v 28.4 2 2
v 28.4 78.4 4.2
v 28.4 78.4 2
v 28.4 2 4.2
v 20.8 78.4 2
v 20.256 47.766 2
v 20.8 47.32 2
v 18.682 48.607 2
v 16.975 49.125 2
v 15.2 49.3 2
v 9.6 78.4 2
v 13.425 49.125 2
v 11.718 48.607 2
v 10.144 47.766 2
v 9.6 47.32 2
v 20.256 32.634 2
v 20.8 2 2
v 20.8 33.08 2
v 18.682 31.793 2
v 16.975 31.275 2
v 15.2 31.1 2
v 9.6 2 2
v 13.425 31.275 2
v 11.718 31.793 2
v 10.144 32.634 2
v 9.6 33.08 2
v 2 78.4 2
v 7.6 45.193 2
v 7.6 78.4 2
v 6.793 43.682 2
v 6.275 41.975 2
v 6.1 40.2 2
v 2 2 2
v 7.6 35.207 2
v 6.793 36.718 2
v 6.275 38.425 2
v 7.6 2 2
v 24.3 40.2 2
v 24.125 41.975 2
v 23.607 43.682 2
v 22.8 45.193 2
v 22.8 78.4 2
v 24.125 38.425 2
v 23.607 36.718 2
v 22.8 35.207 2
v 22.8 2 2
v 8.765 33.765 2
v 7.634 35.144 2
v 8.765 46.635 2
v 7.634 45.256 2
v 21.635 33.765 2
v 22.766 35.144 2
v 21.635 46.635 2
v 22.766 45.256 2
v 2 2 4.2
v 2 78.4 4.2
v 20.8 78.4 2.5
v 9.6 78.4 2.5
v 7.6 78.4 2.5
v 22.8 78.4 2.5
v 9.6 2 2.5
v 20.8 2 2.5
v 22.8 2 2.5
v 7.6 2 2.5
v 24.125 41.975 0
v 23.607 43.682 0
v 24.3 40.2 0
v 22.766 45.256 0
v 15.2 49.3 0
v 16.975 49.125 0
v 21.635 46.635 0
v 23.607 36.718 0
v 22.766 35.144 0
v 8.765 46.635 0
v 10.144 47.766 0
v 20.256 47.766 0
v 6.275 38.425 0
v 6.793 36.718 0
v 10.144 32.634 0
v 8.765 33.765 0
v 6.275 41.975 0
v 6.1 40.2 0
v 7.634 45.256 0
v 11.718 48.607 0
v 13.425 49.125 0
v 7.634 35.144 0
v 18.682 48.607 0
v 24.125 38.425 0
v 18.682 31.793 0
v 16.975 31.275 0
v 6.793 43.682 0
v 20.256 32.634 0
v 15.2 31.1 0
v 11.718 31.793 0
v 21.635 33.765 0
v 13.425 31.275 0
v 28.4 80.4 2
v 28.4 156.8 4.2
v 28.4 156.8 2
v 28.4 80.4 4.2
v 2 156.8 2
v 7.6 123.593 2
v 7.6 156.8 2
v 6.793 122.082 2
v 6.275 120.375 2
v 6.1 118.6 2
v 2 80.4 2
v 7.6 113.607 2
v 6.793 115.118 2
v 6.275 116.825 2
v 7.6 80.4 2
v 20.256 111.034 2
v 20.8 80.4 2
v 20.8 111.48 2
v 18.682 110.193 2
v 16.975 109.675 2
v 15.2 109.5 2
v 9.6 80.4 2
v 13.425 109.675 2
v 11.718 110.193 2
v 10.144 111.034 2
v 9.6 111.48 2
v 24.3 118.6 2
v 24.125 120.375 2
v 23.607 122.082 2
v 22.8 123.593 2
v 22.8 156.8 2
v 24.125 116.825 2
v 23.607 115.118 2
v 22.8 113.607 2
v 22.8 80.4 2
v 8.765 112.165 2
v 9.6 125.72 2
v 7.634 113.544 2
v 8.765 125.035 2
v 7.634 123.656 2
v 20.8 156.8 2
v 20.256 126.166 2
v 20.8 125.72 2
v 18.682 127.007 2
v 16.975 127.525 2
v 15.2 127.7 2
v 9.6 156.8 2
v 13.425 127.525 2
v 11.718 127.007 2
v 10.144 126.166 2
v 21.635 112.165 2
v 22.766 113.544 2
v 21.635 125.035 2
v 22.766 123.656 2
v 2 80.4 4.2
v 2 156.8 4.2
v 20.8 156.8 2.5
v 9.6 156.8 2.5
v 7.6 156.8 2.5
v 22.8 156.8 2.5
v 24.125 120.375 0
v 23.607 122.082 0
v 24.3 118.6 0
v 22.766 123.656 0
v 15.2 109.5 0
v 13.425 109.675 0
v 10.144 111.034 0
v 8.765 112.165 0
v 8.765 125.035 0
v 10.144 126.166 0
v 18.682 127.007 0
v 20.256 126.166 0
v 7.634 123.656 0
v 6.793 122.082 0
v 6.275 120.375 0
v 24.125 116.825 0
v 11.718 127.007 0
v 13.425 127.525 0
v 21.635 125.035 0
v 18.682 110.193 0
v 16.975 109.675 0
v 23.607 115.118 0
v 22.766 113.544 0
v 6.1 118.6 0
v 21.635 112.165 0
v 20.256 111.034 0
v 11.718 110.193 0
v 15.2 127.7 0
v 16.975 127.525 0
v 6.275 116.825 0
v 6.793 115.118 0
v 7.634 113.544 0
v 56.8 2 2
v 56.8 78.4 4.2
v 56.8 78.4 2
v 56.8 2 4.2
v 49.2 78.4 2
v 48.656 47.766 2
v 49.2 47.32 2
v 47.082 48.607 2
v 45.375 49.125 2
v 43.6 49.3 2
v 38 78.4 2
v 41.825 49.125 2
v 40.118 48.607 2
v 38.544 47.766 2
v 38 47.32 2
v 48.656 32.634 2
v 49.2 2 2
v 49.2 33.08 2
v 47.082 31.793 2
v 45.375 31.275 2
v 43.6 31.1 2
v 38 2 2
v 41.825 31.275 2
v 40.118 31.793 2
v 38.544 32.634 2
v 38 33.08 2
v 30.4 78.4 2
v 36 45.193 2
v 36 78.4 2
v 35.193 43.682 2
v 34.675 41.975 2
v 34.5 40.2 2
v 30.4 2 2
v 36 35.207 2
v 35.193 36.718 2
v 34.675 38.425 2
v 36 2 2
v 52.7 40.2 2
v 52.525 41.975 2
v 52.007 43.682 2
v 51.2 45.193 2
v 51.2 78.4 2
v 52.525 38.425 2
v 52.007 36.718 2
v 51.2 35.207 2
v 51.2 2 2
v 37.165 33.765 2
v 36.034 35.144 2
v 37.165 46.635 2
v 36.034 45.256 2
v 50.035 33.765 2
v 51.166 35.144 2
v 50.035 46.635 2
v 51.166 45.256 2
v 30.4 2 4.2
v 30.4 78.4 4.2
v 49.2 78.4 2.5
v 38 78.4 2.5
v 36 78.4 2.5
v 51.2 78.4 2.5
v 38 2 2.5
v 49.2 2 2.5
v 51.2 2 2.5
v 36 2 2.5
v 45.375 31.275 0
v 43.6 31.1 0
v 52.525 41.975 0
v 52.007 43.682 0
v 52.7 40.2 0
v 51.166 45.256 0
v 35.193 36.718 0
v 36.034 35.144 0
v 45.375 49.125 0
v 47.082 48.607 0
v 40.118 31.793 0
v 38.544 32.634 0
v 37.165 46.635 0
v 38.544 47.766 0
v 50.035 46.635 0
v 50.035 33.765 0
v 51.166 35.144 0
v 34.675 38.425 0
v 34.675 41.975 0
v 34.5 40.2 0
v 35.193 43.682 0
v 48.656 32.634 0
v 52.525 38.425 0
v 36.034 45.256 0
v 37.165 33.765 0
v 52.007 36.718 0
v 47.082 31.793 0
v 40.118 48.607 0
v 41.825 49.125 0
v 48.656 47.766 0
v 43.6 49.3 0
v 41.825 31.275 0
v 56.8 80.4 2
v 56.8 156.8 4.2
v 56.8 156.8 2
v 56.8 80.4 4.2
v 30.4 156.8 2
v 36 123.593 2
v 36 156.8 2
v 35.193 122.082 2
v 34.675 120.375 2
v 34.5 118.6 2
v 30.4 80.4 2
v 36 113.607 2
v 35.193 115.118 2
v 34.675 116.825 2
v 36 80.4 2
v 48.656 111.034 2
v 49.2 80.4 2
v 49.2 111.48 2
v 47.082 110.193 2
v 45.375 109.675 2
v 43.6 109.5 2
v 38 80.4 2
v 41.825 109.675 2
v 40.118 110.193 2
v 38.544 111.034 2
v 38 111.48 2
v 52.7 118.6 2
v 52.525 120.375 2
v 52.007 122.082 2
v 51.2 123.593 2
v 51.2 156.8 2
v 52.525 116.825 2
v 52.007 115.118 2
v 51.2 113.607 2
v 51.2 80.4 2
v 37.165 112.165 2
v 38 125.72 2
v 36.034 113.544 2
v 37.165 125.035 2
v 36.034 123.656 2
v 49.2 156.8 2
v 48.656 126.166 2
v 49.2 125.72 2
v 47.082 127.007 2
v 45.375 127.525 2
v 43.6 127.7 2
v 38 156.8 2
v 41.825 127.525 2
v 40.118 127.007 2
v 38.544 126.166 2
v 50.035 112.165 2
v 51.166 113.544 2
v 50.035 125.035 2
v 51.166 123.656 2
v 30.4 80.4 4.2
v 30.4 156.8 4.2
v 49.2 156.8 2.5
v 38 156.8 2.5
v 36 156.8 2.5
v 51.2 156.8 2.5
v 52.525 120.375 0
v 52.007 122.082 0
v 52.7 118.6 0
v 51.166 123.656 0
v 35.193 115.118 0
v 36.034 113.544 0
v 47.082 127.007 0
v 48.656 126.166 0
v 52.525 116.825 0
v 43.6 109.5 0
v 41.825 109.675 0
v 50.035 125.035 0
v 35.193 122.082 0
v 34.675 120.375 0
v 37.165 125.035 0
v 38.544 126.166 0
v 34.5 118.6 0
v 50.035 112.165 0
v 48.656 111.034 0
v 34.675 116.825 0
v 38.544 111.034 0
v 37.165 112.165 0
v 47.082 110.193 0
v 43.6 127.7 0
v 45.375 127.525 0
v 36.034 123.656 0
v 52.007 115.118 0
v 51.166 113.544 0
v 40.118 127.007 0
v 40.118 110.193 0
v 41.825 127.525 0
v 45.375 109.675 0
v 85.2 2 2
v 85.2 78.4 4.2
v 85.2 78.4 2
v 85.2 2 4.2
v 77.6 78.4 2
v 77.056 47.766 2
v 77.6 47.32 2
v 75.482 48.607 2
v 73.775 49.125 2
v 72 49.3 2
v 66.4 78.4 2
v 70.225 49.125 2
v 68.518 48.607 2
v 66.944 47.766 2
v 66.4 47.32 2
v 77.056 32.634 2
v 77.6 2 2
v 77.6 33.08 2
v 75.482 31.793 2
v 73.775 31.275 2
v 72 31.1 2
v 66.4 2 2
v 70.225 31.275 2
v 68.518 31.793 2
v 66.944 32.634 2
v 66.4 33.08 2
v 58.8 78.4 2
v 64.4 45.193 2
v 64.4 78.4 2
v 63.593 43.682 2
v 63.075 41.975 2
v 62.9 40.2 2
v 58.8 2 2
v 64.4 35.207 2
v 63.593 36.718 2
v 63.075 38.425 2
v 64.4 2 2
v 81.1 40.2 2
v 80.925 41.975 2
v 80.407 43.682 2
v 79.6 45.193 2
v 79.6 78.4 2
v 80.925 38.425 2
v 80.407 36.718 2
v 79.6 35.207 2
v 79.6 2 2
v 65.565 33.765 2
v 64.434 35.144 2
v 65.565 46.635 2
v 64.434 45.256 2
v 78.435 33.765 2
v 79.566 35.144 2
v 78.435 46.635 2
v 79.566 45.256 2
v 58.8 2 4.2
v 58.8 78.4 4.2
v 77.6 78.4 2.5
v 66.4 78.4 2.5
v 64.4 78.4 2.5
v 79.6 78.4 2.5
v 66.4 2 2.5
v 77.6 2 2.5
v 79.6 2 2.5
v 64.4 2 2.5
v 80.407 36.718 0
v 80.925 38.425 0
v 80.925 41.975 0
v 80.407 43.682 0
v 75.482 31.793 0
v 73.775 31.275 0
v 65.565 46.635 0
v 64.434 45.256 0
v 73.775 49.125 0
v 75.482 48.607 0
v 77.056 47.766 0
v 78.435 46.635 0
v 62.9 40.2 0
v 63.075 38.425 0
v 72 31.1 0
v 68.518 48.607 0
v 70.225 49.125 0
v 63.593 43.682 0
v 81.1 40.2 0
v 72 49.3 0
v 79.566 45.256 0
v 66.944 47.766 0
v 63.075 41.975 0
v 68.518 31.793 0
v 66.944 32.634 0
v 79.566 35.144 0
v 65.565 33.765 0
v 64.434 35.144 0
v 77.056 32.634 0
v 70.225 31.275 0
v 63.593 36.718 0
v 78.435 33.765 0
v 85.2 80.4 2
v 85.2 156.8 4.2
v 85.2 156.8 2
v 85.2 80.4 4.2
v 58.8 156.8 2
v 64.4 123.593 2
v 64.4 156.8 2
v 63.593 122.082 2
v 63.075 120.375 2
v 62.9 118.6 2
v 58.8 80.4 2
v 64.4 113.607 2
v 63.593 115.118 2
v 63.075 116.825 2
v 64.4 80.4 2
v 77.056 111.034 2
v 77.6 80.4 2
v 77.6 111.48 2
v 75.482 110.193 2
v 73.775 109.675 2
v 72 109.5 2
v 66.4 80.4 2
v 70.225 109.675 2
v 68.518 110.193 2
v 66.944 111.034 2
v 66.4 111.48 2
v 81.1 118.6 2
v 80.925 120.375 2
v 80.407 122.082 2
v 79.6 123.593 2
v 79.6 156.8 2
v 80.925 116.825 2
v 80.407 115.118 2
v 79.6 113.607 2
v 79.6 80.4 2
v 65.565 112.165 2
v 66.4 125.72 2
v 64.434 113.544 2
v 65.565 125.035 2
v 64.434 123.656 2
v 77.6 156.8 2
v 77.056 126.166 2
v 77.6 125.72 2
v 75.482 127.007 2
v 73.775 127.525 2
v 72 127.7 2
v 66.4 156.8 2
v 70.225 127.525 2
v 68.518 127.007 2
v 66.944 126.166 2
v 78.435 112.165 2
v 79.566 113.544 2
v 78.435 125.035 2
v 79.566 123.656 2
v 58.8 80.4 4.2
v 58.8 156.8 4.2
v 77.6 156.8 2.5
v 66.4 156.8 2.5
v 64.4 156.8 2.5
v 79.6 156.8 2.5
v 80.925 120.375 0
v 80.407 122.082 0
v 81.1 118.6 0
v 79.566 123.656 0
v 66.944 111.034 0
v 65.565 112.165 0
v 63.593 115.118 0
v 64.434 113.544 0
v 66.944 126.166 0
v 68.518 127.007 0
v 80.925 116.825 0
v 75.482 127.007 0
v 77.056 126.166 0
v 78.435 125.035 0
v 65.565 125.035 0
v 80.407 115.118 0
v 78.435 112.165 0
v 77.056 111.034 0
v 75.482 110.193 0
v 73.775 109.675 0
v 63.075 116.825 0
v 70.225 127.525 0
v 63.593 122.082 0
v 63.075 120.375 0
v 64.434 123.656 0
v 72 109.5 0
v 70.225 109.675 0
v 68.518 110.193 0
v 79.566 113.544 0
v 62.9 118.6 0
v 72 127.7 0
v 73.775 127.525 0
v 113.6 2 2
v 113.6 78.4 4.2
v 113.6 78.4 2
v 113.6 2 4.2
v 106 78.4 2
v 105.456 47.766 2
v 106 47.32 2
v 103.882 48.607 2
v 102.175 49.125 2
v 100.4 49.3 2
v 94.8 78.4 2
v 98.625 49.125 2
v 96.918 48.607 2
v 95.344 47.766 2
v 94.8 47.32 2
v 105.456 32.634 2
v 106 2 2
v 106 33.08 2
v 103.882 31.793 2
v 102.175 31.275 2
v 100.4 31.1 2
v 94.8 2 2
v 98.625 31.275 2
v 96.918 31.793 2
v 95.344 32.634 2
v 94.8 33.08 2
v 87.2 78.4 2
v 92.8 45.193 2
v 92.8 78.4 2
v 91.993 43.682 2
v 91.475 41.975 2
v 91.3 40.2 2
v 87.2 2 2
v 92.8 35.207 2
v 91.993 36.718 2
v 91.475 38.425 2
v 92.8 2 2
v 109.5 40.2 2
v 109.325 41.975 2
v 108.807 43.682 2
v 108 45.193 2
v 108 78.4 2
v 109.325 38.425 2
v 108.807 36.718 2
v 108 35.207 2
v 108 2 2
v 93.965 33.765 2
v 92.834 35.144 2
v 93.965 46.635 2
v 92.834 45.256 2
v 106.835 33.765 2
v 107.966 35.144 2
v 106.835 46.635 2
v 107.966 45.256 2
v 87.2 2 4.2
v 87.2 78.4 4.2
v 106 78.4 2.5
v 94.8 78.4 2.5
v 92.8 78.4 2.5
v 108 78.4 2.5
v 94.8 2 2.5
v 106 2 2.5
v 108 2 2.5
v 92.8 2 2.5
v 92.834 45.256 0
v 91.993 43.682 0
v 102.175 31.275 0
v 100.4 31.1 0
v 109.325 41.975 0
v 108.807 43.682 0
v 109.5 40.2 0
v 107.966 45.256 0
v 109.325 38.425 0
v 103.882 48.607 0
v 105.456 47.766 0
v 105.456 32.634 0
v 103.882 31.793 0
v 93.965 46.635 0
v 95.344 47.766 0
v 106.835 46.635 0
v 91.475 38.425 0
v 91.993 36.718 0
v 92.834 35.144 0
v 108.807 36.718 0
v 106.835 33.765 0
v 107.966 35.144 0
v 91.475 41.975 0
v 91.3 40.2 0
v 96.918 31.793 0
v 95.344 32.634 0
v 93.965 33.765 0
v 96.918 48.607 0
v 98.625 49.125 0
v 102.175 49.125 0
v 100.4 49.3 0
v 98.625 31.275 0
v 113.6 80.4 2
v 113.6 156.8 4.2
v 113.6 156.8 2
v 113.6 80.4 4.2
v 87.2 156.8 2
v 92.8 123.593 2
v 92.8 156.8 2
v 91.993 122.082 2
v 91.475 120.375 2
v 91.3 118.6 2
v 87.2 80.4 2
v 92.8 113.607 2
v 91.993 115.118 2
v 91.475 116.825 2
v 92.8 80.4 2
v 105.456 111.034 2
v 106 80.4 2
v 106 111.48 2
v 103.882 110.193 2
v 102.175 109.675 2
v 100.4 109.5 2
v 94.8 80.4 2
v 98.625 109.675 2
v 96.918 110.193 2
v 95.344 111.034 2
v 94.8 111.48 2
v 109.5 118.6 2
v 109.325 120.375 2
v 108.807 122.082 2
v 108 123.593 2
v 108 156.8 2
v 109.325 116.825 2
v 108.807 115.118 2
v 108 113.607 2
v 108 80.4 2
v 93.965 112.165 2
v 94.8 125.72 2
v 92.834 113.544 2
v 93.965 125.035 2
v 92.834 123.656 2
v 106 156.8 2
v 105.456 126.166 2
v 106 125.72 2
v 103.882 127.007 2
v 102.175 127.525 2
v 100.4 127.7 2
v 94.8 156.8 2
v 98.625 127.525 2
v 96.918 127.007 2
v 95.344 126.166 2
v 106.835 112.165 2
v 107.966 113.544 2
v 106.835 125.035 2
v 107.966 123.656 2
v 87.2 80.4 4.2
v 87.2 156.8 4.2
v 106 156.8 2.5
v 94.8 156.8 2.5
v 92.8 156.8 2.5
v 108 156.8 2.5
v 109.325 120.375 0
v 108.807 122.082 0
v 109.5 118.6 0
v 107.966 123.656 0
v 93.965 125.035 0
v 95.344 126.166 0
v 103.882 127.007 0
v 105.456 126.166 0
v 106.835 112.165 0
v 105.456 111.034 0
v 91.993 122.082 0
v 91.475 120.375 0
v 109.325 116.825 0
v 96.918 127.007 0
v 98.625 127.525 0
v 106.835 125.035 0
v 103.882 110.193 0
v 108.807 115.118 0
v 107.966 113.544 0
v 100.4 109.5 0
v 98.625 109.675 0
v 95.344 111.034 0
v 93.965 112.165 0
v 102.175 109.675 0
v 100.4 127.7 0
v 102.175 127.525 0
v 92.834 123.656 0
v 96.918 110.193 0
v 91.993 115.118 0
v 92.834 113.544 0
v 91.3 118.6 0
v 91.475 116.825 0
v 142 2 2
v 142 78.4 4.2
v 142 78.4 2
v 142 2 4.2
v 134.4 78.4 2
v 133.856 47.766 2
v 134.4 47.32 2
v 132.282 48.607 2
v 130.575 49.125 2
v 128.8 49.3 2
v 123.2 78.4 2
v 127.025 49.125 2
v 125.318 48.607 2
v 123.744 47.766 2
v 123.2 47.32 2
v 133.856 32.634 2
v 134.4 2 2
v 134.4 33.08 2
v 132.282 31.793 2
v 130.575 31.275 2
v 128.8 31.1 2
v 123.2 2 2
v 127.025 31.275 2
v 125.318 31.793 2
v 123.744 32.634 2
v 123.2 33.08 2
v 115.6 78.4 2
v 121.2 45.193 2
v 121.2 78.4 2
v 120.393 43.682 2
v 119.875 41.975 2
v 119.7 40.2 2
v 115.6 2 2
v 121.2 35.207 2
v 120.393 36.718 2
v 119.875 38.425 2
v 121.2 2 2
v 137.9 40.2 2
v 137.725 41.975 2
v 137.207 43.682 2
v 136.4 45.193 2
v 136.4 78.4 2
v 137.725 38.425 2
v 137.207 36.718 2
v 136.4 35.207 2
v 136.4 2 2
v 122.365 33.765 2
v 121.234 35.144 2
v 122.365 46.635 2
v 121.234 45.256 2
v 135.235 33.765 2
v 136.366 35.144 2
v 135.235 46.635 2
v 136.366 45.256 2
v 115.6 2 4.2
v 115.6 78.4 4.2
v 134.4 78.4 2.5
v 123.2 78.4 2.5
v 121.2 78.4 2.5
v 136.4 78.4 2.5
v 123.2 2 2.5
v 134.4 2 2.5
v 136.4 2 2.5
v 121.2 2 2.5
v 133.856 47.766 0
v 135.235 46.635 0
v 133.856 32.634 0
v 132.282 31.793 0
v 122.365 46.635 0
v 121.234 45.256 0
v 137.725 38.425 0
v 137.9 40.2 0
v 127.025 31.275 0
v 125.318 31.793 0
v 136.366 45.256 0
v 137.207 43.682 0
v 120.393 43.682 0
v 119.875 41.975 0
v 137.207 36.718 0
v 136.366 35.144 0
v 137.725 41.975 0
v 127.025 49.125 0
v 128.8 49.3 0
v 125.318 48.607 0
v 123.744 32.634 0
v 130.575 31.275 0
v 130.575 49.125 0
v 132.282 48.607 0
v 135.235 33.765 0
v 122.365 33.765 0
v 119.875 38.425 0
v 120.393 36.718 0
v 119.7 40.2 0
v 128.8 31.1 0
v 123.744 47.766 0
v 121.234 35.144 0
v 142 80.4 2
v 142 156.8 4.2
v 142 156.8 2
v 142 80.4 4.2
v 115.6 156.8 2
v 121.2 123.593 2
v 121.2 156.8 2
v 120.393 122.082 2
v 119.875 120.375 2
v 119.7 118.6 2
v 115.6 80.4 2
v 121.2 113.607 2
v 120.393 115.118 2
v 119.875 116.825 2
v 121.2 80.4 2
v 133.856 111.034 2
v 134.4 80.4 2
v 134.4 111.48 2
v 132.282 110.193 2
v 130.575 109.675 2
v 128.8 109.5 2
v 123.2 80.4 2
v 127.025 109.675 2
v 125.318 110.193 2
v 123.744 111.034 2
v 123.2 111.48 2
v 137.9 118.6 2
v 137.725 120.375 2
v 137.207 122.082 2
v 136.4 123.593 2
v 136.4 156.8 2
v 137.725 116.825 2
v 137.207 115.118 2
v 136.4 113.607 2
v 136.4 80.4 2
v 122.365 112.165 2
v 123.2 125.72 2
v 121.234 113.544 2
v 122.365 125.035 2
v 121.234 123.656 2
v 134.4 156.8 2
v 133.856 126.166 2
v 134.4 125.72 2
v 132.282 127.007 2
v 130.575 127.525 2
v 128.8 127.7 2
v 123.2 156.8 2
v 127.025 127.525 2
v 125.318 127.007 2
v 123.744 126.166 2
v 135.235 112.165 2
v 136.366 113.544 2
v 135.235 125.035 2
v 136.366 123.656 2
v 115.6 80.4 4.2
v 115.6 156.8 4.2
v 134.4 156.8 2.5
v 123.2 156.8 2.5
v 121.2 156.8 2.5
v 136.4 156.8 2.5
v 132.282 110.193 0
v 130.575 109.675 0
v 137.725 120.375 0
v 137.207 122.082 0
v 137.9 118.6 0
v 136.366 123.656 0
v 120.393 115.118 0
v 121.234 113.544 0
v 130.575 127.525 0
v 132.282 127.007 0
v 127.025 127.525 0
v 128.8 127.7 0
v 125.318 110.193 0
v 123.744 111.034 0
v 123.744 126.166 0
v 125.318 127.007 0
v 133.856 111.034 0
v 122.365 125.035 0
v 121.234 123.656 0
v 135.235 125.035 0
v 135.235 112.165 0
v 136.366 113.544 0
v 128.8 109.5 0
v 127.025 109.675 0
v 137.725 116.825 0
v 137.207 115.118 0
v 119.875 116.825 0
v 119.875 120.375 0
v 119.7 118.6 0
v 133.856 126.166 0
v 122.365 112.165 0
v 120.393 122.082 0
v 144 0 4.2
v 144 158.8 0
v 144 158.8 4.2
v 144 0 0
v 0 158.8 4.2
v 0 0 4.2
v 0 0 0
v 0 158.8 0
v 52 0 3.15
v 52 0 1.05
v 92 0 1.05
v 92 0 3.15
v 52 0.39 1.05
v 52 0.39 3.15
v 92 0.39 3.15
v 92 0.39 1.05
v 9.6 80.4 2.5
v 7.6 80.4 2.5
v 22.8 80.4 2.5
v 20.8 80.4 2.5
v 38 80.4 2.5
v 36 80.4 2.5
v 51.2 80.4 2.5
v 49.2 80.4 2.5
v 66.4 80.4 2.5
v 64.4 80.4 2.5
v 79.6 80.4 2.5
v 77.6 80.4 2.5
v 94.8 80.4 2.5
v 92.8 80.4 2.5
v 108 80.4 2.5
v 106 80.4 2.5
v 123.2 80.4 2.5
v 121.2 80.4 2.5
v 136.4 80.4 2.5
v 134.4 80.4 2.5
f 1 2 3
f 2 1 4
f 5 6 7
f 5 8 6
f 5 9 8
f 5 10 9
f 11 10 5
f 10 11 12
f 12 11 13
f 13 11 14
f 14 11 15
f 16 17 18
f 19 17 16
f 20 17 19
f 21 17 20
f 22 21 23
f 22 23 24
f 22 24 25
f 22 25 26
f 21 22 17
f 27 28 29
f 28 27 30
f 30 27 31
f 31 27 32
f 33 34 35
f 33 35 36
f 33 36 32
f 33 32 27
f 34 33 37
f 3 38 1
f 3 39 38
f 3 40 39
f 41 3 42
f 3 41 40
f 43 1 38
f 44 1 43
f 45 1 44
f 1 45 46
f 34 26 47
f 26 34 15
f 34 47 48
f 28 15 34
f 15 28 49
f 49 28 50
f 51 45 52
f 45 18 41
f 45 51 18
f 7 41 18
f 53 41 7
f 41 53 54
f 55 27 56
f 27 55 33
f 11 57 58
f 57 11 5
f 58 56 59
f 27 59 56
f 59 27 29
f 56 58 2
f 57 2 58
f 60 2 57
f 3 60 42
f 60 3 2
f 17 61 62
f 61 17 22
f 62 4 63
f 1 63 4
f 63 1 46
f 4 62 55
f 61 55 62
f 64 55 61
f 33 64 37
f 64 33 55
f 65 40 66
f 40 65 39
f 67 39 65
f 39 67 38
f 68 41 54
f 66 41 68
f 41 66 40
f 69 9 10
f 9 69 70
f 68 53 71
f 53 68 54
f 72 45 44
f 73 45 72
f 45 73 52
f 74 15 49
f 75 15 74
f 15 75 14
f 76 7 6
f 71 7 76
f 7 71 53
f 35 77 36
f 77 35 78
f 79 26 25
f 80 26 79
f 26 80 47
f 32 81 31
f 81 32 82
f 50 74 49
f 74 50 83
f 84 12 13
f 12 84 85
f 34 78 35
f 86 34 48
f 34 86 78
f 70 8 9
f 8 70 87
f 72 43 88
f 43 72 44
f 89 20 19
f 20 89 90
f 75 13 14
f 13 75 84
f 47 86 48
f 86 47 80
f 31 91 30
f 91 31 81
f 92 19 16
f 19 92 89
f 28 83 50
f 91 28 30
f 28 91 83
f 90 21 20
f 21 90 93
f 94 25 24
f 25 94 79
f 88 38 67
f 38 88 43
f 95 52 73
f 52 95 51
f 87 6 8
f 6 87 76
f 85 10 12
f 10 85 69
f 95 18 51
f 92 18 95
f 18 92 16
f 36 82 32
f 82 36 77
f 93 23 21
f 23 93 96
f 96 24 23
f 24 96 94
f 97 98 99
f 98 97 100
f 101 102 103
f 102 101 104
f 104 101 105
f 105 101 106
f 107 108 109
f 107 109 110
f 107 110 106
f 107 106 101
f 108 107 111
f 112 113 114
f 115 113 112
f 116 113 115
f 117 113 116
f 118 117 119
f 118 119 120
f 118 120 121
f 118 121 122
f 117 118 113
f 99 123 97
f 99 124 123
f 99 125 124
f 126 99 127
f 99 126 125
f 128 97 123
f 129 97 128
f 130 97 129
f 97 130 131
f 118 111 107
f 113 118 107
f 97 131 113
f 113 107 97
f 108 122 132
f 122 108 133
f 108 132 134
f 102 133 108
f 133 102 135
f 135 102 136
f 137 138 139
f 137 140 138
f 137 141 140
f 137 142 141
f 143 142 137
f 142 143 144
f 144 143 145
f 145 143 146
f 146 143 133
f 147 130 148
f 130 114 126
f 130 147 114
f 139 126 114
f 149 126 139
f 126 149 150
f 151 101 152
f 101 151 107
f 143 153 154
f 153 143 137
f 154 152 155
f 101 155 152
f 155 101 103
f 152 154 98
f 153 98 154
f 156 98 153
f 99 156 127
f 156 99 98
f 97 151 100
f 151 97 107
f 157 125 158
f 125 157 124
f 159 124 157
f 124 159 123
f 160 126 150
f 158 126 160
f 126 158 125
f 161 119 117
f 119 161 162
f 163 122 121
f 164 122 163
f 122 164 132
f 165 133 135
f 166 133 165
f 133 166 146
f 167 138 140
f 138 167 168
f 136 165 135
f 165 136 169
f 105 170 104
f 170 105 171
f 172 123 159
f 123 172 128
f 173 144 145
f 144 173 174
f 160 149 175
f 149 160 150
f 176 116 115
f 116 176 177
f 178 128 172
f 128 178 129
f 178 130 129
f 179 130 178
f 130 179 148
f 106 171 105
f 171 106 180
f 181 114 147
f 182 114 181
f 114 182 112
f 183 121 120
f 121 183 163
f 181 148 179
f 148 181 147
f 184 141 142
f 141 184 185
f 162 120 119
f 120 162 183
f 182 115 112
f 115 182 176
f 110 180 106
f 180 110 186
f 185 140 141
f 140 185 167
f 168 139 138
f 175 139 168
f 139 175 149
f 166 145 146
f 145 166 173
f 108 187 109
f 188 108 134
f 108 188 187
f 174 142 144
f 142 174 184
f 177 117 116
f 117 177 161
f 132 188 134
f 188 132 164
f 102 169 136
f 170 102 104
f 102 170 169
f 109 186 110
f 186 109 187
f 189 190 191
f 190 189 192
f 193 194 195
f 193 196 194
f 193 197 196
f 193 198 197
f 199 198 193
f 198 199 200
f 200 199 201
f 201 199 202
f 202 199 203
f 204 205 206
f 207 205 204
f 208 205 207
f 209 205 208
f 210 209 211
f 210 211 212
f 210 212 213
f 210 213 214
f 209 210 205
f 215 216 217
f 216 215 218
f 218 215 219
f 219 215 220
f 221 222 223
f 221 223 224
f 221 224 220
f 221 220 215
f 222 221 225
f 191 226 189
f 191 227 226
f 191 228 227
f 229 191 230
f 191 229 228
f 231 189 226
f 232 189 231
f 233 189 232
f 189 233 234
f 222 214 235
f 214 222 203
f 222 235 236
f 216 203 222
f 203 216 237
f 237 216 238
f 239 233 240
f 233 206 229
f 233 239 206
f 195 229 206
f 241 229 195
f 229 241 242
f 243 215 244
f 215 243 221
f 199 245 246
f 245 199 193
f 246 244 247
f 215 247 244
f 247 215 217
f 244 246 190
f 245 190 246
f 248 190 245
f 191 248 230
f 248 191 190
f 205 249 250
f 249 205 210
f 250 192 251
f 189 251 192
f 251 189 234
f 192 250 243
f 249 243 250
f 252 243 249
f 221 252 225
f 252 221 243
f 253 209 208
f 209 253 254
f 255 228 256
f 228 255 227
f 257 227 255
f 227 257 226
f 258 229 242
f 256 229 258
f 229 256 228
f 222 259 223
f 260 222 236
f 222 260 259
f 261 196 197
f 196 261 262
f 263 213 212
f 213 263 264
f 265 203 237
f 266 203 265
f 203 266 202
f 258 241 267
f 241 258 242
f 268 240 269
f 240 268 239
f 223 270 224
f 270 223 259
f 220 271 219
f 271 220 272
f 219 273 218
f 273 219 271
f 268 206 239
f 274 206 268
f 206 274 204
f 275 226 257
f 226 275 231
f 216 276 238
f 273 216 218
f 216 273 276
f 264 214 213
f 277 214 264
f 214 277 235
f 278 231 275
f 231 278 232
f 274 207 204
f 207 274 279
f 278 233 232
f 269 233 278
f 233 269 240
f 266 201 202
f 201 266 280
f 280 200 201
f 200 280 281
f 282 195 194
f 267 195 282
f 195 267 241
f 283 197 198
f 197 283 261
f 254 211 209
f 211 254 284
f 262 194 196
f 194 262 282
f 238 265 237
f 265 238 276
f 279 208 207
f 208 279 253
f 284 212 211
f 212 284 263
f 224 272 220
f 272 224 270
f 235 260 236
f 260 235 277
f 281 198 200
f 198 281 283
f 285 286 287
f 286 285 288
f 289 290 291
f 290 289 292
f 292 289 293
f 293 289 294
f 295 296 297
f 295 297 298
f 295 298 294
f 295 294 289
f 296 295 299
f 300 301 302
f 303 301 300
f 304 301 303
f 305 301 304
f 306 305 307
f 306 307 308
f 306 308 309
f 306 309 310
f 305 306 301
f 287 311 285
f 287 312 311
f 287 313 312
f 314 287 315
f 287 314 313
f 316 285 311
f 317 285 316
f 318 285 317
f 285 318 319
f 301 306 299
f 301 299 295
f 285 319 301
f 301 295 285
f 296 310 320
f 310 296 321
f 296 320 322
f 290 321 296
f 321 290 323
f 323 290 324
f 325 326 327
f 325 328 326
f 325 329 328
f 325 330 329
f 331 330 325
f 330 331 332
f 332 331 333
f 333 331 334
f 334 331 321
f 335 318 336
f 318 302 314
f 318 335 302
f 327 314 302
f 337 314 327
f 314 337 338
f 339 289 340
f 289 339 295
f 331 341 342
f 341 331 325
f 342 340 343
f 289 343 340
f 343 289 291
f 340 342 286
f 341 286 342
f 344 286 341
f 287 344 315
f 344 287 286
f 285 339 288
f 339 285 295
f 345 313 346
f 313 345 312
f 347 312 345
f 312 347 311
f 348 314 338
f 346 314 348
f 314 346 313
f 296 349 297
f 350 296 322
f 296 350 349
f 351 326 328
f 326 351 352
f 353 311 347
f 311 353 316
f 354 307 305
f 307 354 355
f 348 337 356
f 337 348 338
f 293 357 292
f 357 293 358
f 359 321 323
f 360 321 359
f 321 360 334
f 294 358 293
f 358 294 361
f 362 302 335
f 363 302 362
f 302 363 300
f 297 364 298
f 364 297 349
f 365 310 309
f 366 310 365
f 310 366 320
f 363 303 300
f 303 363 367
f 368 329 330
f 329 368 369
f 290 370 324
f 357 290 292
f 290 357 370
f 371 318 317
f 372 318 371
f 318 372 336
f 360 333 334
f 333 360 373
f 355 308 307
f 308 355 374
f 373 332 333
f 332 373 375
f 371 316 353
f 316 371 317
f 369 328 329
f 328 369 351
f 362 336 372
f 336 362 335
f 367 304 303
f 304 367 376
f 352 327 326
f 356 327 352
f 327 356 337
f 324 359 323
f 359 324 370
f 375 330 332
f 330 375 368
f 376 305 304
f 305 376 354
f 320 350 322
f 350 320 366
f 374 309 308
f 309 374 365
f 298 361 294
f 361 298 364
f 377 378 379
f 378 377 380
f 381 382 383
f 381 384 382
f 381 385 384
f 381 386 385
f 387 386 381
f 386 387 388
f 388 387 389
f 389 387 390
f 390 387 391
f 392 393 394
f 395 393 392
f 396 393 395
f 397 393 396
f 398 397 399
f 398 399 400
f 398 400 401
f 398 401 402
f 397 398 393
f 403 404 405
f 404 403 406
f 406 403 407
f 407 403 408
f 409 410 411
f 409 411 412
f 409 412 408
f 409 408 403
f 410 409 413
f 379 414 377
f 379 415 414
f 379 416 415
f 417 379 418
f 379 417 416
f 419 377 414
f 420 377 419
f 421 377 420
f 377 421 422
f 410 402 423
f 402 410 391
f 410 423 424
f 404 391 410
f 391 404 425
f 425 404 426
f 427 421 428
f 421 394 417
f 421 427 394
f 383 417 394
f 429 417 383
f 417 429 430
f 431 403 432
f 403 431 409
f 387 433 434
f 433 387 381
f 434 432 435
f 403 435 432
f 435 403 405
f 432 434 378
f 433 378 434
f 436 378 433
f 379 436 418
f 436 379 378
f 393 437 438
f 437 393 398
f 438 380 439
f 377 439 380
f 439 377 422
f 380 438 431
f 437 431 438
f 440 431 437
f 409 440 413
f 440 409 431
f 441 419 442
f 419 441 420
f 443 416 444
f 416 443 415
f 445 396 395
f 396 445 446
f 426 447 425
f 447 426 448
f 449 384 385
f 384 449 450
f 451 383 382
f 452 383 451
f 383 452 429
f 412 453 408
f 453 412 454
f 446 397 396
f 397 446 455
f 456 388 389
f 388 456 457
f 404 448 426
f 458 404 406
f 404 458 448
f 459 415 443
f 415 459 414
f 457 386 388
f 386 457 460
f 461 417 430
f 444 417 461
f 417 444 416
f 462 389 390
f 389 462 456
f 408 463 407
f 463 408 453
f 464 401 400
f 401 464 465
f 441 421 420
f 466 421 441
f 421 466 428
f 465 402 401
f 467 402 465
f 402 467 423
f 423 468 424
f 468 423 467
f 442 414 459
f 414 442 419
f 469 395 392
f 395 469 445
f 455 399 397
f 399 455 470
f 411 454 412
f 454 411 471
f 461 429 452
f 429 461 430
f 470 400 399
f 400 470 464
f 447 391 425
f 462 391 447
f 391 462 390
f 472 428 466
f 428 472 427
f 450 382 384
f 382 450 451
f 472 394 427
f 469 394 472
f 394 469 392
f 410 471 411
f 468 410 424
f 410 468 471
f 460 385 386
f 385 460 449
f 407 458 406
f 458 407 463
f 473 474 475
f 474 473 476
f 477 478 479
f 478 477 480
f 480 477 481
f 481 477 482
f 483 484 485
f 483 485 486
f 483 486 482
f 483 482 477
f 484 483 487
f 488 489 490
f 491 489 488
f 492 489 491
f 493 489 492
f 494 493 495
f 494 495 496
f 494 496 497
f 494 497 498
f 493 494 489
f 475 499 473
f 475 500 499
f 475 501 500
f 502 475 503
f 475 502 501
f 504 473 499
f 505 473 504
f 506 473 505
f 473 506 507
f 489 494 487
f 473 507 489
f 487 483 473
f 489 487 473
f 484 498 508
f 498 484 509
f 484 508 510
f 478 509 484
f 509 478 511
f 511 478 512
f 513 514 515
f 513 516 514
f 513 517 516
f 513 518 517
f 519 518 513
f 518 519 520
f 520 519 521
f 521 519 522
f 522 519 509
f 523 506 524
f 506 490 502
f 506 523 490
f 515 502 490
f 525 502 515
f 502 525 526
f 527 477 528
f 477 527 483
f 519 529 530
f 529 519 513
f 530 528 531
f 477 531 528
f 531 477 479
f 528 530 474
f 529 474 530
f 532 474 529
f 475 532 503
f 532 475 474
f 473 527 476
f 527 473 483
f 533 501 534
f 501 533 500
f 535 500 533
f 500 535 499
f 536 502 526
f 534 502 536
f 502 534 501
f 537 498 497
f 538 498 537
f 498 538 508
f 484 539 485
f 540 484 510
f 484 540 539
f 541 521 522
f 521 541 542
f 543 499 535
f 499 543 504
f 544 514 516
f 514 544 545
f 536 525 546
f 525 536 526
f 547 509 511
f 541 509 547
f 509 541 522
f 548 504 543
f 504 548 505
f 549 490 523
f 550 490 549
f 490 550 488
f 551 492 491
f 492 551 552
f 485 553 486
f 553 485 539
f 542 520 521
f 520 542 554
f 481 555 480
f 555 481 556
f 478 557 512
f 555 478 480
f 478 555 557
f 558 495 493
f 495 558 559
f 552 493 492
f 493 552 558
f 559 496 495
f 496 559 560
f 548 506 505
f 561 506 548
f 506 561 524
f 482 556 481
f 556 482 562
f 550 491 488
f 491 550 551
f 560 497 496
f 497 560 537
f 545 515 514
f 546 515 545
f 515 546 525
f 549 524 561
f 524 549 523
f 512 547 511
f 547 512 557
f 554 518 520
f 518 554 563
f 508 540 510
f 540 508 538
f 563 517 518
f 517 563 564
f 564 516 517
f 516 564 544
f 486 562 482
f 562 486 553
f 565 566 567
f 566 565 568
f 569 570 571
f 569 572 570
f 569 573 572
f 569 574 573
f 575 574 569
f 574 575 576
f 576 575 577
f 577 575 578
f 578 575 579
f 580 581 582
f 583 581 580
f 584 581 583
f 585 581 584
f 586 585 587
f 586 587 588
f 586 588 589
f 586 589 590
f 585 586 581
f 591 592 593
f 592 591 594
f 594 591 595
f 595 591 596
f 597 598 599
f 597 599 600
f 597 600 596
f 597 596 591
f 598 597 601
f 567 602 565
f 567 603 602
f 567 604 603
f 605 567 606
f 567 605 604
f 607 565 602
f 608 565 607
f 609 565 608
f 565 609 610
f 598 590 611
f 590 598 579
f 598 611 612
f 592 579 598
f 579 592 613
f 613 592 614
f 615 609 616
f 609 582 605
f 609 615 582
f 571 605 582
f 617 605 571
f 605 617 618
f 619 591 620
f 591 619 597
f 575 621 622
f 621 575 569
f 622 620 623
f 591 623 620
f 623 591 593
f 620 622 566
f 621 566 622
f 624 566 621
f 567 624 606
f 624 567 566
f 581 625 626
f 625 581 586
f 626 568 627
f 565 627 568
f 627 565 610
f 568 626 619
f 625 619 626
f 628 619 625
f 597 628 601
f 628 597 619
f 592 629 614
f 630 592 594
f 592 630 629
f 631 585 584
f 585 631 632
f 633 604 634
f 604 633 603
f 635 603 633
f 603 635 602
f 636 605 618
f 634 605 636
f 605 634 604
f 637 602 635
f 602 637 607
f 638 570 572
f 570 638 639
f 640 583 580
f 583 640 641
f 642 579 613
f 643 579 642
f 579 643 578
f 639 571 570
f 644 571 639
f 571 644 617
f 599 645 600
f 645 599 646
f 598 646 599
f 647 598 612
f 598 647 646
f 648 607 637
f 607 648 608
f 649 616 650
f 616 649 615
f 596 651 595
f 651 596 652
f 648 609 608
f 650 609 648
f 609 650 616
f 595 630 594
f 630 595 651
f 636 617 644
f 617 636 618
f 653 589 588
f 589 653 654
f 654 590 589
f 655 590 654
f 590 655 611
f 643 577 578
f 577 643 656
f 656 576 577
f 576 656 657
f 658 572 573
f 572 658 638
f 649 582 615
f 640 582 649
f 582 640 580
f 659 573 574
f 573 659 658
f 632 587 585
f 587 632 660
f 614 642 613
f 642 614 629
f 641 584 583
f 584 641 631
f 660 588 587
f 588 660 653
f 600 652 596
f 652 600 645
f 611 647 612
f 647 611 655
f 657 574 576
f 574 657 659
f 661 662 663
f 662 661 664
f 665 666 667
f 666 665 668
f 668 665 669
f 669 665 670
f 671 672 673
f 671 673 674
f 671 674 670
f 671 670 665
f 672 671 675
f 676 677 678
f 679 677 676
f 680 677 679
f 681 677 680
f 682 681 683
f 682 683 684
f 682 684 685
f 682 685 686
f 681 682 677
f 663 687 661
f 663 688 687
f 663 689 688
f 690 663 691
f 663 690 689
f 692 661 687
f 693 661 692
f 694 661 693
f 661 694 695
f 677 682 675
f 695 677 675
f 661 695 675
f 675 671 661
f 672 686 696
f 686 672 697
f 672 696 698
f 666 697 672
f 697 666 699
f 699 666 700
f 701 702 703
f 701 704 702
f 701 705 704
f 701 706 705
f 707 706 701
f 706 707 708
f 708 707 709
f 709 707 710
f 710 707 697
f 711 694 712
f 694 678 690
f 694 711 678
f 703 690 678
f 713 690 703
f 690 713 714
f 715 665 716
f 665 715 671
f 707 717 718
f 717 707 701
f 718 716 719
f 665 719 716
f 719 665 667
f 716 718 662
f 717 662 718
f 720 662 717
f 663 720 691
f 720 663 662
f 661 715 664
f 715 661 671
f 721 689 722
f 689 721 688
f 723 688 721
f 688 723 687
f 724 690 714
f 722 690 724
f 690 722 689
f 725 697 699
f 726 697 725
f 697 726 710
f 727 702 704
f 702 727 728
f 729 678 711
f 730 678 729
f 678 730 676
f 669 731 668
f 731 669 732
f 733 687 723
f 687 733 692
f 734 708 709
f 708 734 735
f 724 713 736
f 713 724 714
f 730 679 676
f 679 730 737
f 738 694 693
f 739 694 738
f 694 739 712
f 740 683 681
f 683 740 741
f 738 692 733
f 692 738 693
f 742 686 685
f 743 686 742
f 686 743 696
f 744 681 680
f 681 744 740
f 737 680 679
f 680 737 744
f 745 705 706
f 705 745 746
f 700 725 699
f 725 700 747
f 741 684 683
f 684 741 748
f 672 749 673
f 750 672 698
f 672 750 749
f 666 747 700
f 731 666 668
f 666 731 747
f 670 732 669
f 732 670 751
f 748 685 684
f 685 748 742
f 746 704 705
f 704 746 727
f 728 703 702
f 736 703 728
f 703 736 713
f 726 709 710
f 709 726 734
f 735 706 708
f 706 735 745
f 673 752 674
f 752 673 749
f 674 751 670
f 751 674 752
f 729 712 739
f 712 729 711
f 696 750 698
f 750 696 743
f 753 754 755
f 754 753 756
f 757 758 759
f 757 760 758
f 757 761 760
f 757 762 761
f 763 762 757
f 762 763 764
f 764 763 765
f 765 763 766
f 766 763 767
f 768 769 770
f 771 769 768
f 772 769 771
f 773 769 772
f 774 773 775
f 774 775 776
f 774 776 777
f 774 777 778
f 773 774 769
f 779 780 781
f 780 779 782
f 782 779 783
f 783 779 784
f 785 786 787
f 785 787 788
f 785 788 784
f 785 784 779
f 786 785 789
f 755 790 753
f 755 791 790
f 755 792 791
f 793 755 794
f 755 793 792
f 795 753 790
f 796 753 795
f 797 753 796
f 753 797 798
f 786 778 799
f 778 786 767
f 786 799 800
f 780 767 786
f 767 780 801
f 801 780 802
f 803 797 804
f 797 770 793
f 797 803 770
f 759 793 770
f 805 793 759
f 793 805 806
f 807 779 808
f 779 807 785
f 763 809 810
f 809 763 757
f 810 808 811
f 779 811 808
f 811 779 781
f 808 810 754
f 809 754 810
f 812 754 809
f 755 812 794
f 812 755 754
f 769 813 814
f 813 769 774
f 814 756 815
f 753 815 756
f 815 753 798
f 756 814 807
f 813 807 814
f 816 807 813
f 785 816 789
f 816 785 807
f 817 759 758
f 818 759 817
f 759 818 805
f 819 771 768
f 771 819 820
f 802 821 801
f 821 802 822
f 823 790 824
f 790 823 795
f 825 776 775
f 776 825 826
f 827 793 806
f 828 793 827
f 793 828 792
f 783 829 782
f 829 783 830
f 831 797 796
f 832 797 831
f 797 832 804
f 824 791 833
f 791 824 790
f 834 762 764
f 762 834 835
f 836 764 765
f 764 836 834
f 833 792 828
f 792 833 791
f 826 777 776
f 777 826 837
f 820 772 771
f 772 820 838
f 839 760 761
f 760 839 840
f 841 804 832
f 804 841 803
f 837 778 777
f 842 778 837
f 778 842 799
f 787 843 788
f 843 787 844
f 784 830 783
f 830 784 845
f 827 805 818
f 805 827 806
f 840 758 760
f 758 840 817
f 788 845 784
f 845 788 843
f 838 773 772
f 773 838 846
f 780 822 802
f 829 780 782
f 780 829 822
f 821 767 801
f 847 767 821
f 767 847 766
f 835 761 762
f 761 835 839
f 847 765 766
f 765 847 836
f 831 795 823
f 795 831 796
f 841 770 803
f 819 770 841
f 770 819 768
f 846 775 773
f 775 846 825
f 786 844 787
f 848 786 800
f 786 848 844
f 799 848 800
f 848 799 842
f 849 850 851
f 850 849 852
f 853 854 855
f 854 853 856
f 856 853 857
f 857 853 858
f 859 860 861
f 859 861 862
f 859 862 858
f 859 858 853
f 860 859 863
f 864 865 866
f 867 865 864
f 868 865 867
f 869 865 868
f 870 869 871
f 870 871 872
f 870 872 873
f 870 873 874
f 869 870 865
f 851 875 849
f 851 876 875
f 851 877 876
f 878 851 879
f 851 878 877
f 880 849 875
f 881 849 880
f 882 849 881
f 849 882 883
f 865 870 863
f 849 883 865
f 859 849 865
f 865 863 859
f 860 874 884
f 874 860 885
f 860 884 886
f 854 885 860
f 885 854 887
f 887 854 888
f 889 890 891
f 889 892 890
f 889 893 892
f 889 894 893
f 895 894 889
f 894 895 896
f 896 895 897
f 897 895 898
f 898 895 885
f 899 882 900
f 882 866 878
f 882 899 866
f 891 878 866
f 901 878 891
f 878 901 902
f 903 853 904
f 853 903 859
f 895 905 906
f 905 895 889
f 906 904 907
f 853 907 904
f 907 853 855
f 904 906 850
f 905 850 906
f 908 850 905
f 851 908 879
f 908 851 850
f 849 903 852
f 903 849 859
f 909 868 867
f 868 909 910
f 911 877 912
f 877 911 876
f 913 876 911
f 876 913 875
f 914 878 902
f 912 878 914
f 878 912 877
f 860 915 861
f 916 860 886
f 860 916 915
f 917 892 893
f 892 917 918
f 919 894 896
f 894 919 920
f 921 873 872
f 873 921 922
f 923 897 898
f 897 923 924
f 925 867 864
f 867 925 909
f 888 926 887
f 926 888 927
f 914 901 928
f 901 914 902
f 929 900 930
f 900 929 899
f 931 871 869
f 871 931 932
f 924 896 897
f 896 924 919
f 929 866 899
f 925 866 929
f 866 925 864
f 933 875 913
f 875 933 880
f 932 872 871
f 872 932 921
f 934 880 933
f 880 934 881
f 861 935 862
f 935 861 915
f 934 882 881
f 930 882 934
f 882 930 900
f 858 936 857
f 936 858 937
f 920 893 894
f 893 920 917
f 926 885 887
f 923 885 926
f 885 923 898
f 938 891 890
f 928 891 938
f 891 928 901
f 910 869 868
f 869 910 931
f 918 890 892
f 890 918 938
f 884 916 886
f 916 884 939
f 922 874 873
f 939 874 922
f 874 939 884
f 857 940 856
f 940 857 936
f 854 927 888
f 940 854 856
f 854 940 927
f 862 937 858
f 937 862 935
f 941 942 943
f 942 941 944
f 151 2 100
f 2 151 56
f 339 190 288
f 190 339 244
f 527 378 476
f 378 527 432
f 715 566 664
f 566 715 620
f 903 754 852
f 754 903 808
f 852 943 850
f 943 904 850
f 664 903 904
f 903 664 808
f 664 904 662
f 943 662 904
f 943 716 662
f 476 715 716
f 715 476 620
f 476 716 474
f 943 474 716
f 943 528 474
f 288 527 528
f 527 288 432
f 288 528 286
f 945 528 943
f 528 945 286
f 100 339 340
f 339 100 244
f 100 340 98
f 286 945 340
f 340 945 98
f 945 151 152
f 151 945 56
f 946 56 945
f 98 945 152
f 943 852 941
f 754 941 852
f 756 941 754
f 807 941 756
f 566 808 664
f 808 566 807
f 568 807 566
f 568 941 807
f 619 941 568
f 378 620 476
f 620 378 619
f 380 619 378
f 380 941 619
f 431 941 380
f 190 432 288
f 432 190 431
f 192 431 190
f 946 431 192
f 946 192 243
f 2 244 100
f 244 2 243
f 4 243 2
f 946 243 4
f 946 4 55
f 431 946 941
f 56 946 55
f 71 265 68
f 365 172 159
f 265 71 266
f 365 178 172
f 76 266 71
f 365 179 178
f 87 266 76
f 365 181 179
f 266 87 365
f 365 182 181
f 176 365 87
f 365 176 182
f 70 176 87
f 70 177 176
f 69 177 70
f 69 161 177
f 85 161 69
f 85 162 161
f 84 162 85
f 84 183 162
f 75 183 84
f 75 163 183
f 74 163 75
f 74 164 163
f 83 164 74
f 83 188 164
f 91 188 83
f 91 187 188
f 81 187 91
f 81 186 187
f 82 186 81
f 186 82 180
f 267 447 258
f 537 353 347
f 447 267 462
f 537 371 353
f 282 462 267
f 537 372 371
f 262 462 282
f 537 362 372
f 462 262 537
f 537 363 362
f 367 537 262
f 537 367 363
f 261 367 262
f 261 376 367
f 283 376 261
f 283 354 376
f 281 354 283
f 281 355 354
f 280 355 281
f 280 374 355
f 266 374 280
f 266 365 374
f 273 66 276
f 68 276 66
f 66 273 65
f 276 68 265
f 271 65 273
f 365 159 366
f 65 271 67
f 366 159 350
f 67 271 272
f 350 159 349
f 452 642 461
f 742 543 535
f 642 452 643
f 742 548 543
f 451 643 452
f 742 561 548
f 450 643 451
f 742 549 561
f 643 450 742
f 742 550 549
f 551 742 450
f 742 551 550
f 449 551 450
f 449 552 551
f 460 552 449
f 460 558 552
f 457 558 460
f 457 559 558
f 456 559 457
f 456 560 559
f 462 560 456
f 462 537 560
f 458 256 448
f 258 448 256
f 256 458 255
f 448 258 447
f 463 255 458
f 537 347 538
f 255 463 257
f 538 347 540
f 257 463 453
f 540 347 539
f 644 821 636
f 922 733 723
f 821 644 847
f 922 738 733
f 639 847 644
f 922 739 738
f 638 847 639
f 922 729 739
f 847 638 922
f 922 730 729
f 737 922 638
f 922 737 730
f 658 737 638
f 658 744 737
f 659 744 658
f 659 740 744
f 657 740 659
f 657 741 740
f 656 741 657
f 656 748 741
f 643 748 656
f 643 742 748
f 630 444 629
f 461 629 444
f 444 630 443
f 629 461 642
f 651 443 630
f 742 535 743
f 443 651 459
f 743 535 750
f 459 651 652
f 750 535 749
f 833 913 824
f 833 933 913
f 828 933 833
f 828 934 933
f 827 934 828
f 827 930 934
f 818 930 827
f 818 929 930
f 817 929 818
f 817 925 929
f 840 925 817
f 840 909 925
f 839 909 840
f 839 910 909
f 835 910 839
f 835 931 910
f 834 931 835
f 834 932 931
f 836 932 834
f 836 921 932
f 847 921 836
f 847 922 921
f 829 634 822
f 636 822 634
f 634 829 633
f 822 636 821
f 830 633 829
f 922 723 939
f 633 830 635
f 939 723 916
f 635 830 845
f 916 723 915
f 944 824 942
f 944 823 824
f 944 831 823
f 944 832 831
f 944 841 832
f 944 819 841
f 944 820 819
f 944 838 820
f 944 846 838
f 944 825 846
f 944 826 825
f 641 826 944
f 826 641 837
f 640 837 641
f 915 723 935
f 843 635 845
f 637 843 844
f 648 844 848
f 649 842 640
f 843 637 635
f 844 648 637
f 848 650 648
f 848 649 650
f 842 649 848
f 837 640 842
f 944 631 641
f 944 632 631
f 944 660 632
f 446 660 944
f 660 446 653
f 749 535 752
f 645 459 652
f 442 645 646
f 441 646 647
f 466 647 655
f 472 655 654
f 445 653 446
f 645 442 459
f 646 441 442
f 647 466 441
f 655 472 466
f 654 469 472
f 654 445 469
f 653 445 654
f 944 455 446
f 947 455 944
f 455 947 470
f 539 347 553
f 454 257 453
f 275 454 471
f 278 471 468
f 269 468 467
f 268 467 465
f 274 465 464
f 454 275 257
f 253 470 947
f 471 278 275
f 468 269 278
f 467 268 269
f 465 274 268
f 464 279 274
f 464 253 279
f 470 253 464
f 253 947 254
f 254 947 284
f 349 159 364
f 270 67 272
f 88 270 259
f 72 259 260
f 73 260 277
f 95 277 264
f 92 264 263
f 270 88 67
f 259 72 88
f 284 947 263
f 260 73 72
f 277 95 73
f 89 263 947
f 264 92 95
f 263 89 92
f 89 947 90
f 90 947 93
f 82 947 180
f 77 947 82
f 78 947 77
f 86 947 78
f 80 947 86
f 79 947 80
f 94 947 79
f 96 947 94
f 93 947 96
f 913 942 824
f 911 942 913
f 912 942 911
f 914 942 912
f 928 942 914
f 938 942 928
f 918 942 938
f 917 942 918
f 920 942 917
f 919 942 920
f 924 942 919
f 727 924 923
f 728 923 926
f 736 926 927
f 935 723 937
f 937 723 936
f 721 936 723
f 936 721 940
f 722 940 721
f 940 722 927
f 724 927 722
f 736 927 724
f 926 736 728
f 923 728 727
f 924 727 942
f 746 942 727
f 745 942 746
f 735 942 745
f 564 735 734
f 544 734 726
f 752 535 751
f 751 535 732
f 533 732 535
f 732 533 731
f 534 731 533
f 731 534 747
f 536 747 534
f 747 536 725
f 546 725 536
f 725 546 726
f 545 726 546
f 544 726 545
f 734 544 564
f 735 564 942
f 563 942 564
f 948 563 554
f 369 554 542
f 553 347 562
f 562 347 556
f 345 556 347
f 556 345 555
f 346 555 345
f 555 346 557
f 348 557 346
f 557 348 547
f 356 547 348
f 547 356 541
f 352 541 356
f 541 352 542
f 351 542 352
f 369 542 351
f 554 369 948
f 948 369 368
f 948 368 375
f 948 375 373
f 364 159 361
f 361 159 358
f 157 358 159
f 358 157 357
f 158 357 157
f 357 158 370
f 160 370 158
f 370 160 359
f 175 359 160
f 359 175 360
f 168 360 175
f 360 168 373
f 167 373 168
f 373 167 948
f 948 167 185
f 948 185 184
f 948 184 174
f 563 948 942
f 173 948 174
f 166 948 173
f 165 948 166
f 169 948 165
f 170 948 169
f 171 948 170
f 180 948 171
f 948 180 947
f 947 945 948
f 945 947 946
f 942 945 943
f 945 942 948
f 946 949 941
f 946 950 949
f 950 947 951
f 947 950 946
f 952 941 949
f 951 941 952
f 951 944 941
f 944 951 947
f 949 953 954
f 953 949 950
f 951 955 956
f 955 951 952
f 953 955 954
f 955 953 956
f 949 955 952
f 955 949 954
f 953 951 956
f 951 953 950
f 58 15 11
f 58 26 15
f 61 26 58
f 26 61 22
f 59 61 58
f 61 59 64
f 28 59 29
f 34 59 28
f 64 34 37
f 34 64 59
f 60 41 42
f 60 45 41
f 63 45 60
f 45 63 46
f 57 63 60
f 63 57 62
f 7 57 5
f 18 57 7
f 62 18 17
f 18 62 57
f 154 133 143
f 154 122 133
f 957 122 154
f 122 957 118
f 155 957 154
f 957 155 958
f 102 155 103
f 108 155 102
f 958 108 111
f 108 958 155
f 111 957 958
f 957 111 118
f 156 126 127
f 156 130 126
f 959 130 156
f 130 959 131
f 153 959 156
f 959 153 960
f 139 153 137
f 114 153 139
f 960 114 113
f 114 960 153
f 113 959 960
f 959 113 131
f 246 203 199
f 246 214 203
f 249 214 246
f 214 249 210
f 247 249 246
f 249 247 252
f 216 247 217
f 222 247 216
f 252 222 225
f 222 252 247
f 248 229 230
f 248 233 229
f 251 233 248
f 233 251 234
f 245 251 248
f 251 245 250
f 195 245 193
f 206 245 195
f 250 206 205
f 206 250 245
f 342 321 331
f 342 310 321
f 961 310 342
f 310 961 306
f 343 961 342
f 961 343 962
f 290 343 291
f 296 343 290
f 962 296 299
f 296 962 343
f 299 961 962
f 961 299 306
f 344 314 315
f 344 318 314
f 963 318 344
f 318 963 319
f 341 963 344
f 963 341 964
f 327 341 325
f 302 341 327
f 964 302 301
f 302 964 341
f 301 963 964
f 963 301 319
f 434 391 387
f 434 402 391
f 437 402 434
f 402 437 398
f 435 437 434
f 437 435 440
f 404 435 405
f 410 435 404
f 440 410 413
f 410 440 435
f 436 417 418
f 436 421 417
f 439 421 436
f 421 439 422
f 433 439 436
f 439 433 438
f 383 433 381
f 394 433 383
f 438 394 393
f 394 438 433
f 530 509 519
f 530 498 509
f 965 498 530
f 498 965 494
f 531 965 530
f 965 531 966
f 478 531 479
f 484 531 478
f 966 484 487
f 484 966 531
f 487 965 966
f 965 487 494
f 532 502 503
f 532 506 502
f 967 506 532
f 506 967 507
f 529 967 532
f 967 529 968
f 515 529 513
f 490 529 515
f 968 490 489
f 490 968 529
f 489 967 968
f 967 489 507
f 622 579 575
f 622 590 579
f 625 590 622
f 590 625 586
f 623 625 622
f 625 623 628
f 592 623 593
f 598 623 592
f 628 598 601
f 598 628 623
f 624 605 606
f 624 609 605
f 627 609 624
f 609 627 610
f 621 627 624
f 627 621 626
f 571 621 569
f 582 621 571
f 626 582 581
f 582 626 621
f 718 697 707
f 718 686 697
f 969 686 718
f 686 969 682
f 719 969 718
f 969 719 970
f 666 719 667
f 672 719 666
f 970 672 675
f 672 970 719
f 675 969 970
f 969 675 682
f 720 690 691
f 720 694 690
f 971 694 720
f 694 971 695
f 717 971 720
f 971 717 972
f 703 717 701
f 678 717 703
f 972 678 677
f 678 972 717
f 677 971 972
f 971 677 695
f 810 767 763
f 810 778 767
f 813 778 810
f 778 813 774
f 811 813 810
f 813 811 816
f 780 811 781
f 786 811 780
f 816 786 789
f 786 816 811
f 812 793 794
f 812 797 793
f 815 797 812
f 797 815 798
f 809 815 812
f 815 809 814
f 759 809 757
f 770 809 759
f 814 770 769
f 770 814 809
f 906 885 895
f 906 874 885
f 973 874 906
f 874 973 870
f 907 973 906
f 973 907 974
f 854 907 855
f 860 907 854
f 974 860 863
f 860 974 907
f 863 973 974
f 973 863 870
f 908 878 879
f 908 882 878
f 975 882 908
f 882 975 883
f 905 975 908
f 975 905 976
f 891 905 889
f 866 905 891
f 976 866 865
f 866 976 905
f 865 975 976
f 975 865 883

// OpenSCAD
// ============================================================================
// tray.scad — Class I: Horizontal Planar Tray
// ============================================================================
// Reference: docs/RESEARCH.pdf §3 (Horizontal Planar Systems)
//
// Flat tray with recessed pockets arranged in a grid. Each pocket holds one
// slide lying flat, with anti-capillary floor ribs to break vacuum seal and
// cylindrical finger notches for ergonomic removal.
//
// Parts:
//   render_mode 0 → tray
// ============================================================================

use <slide_lib.scad>

// ---------------------------------------------------------------------------
// Parameters (injected by platform via -D)
// ---------------------------------------------------------------------------

// --- Slide Standard ---
slide_standard = 0;       // 0=ISO, 1=US, 2=Petrographic, 3=Supa Mega, 4=Custom
custom_slide_length = 76;
custom_slide_width = 26;
custom_slide_thickness = 1.0;

// --- Architecture ---
num_slots = 10;            // Total slide count (rows x columns)

// --- Tolerances ---
tolerance_xy = 0.4;        // XY clearance (mm)
tolerance_z = 0.2;         // Z / thickness clearance (mm)

// --- Structure ---
wall_thickness = 2.0;      // Outer wall thickness (mm)

// --- Tray-specific ---
tray_columns = 5;          // Columns of slide pockets
tray_rows = 2;             // Rows of slide pockets
finger_notch = 1;          // 1=generate finger notch per pocket
anti_capillary = 1;        // 1=generate anti-capillary floor ribs

// --- Features ---
label_area = 1;            // 1=generate debossed label recess

// --- Quality ---
fn = 0;                    // Resolution ($fn), 0 = auto

// --- Mode ---
render_mode = 0;           // 0=tray

// ---------------------------------------------------------------------------
// Resolution
// ---------------------------------------------------------------------------
$fn = fn > 0 ? fn : 32;

// ---------------------------------------------------------------------------
// Resolve Slide Dimensions
// ---------------------------------------------------------------------------
_slide = resolve_slide(slide_standard, custom_slide_length,
                       custom_slide_width, custom_slide_thickness);
_sl = _slide[0];   // slide length
_sw = _slide[1];   // slide width
_st = _slide[2];   // slide thickness

// ---------------------------------------------------------------------------
// Derived Dimensions (RESEARCH §3, §4.1, §4.2)
// ---------------------------------------------------------------------------

// Pocket dimensions: slide + tolerance + clearance
_pocket_l = _sl + tolerance_xy;
_pocket_w = _sw + tolerance_xy;
_pocket_d = _st + tolerance_z + 1.0;   // depth: slide thickness + clearance + recess

// Spacing between pockets
_gap = wall_thickness;

// Finger notch (RESEARCH §4.2: 15-22mm width, extends below floor)
_finger_r = max(8, _sw * 0.35);

// Body envelope
_body_x = (tray_columns * (_pocket_w + _gap)) + _gap;
_body_y = (tray_rows * (_pocket_l + _gap)) + _gap;
_body_z = _pocket_d + wall_thickness;

// Anti-capillary rib height (RESEARCH §4.1: 0.5-1.0mm)
_acr_h = 0.5;

// ---------------------------------------------------------------------------
// tray — Flat tray with recessed pockets
// ---------------------------------------------------------------------------
module tray() {
    difference() {
        // Solid base
        cube([_body_x, _body_y, _body_z]);

        // Pockets (grid of recesses)
        for (col = [0 : tray_columns - 1]) {
            for (row = [0 : tray_rows - 1]) {
                _px = _gap + col * (_pocket_w + _gap);
                _py = _gap + row * (_pocket_l + _gap);
                _pz = wall_thickness;

                // Pocket recess
                translate([_px, _py, _pz])
                    cube([_pocket_w, _pocket_l, _pocket_d + 1]);

                // Finger notch (cylindrical cutout at center-front of pocket)
                if (finger_notch == 1) {
                    translate([_px + _pocket_w / 2, _py + _pocket_l / 2, -0.01])
                        finger_notch(radius = _finger_r, depth = _body_z + 0.02);
                }
            }
        }

        // Label recess on front face
        if (label_area == 1) {
            _label_w = min(40, _body_x * 0.5);
            _label_h = min(10, _body_z * 0.5);
            translate([(_body_x - _label_w) / 2, -0.01, (_body_z - _label_h) / 2])
                rotate([90, 0, 0])
                    translate([0, 0, -0.4])
                        label_recess(_label_w, _label_h, 0.5);
        }
    }

    // Anti-capillary ribs inside each pocket (RESEARCH §4.1)
    if (anti_capillary == 1) {
        for (col = [0 : tray_columns - 1]) {
            for (row = [0 : tray_rows - 1]) {
                _px = _gap + col * (_pocket_w + _gap);
                _py = _gap + row * (_pocket_l + _gap);
                _pz = wall_thickness;

                translate([_px, _py, _pz])
                    anti_capillary_ribs(_pocket_l, _pocket_w, _acr_h);
            }
        }
    }
}

// ---------------------------------------------------------------------------
// Render Mode Dispatch
// ---------------------------------------------------------------------------
if (render_mode == 0) {
    tray();
}
